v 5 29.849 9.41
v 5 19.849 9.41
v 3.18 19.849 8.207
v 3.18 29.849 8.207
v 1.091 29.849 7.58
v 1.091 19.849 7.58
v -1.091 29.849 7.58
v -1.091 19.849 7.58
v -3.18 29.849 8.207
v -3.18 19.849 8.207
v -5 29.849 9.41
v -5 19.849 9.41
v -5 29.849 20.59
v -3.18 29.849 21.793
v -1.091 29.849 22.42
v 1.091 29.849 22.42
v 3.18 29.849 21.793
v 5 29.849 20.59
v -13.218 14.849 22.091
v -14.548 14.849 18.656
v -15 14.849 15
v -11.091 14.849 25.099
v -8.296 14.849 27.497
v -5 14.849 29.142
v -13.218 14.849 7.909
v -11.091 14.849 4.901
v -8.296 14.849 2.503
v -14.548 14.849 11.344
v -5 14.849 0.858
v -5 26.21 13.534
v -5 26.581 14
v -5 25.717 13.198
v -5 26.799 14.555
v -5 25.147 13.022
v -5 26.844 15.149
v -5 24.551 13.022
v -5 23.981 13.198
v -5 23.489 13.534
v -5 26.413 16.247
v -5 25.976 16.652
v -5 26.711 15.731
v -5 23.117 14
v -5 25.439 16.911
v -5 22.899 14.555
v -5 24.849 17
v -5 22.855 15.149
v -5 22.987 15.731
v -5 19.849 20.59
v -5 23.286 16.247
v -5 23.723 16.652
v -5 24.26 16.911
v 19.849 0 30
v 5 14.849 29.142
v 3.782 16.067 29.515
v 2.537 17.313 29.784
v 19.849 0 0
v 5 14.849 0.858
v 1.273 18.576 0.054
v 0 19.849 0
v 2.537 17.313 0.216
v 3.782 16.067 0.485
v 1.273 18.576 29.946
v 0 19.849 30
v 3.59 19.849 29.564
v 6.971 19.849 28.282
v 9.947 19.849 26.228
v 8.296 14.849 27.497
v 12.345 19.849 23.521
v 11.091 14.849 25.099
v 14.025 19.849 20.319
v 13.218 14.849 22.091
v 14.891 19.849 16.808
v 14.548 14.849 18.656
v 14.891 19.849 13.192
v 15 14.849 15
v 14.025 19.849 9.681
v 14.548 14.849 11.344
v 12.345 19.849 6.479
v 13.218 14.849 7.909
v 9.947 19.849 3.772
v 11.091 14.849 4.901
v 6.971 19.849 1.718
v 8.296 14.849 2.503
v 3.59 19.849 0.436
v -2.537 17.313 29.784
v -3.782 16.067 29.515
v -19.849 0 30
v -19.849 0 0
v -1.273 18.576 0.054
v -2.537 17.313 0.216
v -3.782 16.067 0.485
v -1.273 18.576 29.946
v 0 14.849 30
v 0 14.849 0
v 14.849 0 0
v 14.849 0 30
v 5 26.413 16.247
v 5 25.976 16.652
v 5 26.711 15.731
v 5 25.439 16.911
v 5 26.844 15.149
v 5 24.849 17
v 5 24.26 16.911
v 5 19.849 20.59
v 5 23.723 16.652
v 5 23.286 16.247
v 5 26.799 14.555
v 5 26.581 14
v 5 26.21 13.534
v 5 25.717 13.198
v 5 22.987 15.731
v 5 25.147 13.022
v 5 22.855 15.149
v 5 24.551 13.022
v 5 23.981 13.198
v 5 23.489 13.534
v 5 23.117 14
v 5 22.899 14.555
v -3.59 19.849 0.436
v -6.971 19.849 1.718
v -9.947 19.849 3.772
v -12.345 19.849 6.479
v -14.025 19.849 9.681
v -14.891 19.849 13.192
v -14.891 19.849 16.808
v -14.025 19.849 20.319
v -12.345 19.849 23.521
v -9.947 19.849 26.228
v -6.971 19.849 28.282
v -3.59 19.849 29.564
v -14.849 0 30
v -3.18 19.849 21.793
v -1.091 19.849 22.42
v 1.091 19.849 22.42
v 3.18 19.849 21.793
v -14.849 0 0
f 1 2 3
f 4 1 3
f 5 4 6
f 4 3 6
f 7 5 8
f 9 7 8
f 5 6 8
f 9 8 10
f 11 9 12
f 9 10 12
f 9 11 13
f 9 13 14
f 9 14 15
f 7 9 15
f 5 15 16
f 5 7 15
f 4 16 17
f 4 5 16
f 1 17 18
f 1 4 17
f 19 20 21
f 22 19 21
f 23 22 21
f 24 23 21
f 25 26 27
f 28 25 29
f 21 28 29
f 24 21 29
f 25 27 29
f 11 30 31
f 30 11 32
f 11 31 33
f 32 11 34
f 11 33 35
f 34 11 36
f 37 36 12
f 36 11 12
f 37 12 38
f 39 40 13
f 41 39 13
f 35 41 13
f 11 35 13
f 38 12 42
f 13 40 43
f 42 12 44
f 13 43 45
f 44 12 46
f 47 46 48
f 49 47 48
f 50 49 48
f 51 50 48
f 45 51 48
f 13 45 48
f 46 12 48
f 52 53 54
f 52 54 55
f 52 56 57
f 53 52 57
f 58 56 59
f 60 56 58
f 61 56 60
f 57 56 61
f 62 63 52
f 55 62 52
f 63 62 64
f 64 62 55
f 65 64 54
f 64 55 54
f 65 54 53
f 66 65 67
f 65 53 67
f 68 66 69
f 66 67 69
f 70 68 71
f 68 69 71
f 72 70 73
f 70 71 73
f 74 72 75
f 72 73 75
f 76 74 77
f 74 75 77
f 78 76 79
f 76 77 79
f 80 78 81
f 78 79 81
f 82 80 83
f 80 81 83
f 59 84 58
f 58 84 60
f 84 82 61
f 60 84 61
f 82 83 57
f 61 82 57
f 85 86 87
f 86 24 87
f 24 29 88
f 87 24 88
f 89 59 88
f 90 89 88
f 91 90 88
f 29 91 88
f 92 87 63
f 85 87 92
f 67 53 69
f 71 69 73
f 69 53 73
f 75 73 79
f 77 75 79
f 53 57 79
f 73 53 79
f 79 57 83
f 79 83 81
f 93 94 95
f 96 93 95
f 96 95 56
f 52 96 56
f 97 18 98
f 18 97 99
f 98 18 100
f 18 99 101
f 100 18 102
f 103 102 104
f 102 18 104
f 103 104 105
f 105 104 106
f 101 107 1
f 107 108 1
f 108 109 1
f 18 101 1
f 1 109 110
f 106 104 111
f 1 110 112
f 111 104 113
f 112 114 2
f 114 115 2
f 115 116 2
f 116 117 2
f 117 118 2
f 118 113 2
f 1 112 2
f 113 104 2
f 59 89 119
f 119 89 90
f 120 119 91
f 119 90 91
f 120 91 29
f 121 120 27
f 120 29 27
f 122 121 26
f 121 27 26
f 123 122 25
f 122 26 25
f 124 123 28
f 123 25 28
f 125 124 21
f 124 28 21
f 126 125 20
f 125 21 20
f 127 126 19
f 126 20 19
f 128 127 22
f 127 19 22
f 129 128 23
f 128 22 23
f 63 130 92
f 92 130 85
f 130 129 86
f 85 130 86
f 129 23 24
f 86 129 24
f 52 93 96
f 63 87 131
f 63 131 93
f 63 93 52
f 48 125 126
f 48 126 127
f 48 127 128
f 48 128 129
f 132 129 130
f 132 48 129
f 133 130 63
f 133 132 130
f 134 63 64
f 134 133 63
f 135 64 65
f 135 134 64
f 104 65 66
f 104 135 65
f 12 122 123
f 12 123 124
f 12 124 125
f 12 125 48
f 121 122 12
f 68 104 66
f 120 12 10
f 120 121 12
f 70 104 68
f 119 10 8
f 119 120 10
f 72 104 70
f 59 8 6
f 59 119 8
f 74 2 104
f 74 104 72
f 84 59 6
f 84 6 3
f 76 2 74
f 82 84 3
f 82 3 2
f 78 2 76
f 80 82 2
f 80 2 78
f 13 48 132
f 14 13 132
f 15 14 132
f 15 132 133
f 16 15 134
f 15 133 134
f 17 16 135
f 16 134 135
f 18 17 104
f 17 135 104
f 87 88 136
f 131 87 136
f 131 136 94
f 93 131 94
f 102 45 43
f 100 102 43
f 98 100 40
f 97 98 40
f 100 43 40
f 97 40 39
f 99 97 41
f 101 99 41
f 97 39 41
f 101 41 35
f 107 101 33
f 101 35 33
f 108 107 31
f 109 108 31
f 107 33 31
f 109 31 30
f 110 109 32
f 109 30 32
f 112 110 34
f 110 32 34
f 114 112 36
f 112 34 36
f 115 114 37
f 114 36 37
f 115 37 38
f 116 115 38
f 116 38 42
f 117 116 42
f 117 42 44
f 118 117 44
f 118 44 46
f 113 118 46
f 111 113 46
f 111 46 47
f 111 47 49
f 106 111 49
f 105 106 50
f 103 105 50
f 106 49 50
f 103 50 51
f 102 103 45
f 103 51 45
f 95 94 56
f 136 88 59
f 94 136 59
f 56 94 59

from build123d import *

# Parameters (mm, degrees)
BOSS_EXTRU_1_DEPTH      = 30
ESQUISSE2_R             = 15
BOSS_EXTRU_2_DEPTH      = 5
BOSS_EXTRU_3_DEPTH      = 10
ESQUISSE7_R             = 2
ENL_V_MAT_EXTRU_1_DEPTH = 10


with BuildPart() as part:
    # Esquisse1 → Boss.-Extru.1 (new body)
    with BuildSketch(Plane.XY):
        Polygon((-14.849242405, 0), (0, 14.849242405), (14.849242405, 0), (19.849242405, 0), (0, 19.849242405), (-19.849242405, 0), align=None)
    extrude(amount=BOSS_EXTRU_1_DEPTH)

    # Esquisse2 → Boss.-Extru.2 (add)
    with BuildSketch(Plane(origin=(0, 14.849242405, 0), x_dir=(1, 0, 0), z_dir=(0, 1, 0))):
        with Locations((0, -15)):
            Circle(ESQUISSE2_R)
    extrude(amount=BOSS_EXTRU_2_DEPTH)

    # Esquisse5 → Boss.-Extru.3 (add)
    with BuildSketch(Plane(origin=(0, 19.849242405, 0), x_dir=(1, 0, 0), z_dir=(0, 1, 0))):
        with BuildLine():
            ThreePointArc((5, -9.409830056), (0, -7.5), (-5, -9.409830056))
            Line((-5, -9.409830056), (-5, -15))
            Line((-5, -15), (5, -15))
            Line((5, -15), (5, -9.409830056))
        make_face()
        with BuildLine():
            Line((5, -15), (-5, -15))
            Line((-5, -15), (-5, -20.590169944))
            ThreePointArc((-5, -20.590169944), (0, -22.5), (5, -20.590169944))
            Line((5, -20.590169944), (5, -15))
        make_face()
    extrude(amount=BOSS_EXTRU_3_DEPTH)

    # Esquisse7 → Enlèv. mat.-Extru.1 (cut)
    with BuildSketch(Plane.ZY.offset(5)):
        with Locations((15, 24.849242405)):
            Circle(ESQUISSE7_R)
    extrude(amount=-ENL_V_MAT_EXTRU_1_DEPTH, mode=Mode.SUBTRACT)


solid = part.part
